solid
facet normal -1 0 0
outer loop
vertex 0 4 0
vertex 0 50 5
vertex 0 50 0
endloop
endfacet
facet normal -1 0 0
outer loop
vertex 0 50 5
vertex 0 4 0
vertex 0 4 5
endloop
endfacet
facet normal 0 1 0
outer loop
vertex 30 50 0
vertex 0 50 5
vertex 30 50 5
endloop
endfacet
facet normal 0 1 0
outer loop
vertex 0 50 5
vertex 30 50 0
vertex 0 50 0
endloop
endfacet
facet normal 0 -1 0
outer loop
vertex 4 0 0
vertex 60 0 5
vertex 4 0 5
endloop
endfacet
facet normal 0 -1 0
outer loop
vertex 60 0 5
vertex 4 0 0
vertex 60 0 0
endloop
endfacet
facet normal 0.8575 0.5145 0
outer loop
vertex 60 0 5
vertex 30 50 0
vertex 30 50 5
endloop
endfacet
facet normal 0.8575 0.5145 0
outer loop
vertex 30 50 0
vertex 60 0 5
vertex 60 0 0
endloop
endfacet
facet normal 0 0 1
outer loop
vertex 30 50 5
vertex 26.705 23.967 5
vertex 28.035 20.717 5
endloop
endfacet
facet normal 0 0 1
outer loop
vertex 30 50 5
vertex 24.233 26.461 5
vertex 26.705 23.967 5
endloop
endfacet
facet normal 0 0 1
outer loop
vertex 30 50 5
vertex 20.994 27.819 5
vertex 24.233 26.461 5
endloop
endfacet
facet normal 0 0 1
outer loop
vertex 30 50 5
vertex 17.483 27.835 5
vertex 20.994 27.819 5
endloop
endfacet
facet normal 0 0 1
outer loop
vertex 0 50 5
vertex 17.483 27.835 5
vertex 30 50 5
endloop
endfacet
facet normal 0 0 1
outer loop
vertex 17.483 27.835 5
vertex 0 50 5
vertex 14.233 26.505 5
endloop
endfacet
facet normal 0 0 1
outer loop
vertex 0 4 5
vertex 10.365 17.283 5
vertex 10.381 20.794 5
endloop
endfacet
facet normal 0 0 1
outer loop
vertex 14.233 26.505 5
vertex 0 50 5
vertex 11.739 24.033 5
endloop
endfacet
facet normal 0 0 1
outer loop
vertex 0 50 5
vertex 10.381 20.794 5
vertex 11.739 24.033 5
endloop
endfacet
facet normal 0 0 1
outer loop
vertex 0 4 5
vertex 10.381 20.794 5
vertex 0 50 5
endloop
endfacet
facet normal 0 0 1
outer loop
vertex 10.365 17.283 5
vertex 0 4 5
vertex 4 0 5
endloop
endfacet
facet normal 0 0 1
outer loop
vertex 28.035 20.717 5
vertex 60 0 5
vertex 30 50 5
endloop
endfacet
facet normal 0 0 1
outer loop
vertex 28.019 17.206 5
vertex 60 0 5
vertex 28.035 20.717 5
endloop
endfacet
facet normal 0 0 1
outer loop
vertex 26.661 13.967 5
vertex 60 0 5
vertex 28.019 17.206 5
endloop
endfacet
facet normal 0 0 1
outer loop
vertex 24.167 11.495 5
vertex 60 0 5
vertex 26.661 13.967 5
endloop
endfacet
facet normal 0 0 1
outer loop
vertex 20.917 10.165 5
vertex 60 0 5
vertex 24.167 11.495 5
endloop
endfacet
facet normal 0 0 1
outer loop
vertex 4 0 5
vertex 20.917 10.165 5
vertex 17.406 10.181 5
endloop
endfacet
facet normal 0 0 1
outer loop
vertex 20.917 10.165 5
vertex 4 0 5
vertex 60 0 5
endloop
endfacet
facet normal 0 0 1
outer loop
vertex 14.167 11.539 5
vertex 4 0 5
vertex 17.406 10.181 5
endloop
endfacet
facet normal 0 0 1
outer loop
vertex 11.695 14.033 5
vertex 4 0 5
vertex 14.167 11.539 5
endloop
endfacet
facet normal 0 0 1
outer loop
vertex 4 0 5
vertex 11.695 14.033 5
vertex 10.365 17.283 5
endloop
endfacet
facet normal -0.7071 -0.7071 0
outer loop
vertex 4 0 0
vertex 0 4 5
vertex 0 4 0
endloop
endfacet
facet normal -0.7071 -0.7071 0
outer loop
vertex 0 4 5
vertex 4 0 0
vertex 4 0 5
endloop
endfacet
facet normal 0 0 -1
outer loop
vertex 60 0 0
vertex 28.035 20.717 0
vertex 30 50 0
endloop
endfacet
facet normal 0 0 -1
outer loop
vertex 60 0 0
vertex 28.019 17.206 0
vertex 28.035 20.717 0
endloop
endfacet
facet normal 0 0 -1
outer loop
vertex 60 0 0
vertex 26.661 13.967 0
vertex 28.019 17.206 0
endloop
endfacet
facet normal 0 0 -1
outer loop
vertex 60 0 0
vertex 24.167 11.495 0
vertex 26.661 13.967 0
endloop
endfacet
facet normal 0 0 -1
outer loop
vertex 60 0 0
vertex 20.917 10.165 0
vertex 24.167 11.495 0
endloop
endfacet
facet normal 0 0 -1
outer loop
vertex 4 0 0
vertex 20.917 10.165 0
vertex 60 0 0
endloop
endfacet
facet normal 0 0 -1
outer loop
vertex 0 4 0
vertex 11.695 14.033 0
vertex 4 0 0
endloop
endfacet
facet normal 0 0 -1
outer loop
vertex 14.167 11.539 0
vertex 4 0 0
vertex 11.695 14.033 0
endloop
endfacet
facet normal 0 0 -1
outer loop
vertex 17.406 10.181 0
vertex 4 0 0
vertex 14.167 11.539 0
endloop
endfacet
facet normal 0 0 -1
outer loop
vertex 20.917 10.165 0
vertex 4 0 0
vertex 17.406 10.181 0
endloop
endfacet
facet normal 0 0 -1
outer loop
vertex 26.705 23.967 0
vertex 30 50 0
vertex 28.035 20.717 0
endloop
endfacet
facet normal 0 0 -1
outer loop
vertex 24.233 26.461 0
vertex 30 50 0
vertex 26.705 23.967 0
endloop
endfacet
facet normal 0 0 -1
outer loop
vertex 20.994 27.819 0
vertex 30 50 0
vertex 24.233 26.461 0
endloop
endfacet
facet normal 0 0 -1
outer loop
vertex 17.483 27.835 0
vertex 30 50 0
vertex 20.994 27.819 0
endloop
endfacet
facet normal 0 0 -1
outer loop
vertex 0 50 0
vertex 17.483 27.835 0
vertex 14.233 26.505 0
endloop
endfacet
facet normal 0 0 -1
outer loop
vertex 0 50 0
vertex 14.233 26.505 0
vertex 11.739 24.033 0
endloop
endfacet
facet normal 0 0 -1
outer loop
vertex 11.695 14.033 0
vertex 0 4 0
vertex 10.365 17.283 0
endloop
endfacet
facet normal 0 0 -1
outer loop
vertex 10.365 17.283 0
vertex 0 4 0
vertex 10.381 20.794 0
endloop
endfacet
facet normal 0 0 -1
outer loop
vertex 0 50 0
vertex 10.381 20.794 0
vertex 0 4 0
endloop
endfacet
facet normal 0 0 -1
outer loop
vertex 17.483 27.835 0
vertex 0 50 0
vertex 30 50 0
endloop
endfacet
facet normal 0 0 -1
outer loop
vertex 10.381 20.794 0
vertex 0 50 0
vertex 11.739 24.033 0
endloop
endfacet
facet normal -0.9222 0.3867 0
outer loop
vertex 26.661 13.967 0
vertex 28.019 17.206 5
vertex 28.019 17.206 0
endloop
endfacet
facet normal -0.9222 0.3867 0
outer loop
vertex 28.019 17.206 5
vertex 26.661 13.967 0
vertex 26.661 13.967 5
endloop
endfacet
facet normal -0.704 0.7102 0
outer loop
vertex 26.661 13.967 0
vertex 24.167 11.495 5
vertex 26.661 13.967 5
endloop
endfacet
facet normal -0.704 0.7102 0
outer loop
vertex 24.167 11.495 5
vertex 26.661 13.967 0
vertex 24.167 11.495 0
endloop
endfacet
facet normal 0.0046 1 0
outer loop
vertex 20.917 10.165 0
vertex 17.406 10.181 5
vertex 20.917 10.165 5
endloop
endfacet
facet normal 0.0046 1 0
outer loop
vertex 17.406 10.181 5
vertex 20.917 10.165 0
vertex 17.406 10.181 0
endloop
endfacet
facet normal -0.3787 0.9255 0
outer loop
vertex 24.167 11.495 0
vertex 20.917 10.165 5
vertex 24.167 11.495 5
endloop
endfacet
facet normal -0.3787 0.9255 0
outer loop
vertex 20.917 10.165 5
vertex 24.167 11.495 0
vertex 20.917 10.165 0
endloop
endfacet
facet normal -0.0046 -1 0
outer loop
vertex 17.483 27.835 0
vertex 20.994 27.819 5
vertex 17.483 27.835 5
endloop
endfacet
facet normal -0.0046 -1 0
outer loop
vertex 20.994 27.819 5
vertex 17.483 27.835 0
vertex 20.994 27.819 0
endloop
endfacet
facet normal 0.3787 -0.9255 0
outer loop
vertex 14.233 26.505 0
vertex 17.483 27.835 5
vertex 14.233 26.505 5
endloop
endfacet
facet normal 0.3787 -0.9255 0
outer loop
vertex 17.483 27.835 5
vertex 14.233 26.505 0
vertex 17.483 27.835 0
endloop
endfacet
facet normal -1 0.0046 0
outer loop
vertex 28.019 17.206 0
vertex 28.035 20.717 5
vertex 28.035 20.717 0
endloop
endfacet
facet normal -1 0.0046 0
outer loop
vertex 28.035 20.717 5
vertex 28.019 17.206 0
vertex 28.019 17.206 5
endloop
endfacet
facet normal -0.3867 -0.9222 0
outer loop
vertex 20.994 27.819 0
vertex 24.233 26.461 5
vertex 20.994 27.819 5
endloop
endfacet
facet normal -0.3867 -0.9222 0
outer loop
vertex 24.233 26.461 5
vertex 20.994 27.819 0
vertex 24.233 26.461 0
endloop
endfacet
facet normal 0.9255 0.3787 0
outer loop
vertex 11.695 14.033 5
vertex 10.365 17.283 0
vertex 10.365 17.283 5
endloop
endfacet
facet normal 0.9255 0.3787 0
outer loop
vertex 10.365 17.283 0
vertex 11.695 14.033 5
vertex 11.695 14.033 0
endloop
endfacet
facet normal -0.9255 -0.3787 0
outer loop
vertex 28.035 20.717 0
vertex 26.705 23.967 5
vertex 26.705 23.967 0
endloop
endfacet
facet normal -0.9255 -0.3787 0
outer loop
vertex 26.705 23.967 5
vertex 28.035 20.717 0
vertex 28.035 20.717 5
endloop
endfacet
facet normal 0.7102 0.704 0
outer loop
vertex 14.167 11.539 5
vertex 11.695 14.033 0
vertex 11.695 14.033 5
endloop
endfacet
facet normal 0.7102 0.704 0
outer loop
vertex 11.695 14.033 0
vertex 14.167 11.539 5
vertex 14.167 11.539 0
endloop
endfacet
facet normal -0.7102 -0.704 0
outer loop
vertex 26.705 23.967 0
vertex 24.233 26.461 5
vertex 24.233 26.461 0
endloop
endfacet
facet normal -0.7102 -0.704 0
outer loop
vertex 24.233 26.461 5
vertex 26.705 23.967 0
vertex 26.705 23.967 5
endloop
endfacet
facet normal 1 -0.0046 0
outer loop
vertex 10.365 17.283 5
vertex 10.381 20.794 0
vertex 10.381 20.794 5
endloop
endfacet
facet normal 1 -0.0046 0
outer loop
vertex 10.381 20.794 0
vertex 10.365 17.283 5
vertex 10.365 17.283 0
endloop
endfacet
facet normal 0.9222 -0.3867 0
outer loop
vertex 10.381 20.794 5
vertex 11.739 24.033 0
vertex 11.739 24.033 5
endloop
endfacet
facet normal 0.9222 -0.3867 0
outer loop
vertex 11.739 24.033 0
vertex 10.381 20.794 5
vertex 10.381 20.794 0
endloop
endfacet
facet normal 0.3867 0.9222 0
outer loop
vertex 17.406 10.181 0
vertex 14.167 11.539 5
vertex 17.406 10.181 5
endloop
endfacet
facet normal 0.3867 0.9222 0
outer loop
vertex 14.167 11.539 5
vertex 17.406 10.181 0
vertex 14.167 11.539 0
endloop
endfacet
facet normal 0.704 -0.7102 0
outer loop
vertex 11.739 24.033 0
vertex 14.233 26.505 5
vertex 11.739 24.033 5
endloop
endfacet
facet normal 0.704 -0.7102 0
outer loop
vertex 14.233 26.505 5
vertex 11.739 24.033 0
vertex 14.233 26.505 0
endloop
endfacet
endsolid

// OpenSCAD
$fn = 32;

// ----------------------------------------------------------------------
// Bracket plate: gusset 60 x 50
// ----------------------------------------------------------------------

// --- parameters (mm) ---
hole_r = 4;               // bolt hole radius
plate_t = 5;              // plate thickness, Z (extrusion height)
gus_a = 60;               // base length
gus_b = 50;               // height
top_x = 30;               // top edge X of the angled cut
light_r = 9;              // lightening hole radius

light_d = 2 * light_r;

profile = [[4, 0], [30, 0], [60, 0], [30, 50], [0, 50], [0, 4]];  // primary outline, 6 points, counter clockwise
void_1 = [[28.035, 20.717], [26.705, 23.967], [24.233, 26.461], [20.994, 27.819], [17.483, 27.835], [14.233, 26.505], [11.739, 24.033], [10.381, 20.794], [10.365, 17.283], [11.695, 14.033], [14.167, 11.539], [17.406, 10.181], [20.917, 10.165], [24.167, 11.495], [26.661, 13.967], [28.019, 17.206]];  // lightening hole, 16 points

// --- the one profile operation ---
difference() {
  linear_extrude(height = plate_t) polygon(points = profile);
  translate([0, 0, -1])
    linear_extrude(height = plate_t + 2) polygon(points = void_1);
}
